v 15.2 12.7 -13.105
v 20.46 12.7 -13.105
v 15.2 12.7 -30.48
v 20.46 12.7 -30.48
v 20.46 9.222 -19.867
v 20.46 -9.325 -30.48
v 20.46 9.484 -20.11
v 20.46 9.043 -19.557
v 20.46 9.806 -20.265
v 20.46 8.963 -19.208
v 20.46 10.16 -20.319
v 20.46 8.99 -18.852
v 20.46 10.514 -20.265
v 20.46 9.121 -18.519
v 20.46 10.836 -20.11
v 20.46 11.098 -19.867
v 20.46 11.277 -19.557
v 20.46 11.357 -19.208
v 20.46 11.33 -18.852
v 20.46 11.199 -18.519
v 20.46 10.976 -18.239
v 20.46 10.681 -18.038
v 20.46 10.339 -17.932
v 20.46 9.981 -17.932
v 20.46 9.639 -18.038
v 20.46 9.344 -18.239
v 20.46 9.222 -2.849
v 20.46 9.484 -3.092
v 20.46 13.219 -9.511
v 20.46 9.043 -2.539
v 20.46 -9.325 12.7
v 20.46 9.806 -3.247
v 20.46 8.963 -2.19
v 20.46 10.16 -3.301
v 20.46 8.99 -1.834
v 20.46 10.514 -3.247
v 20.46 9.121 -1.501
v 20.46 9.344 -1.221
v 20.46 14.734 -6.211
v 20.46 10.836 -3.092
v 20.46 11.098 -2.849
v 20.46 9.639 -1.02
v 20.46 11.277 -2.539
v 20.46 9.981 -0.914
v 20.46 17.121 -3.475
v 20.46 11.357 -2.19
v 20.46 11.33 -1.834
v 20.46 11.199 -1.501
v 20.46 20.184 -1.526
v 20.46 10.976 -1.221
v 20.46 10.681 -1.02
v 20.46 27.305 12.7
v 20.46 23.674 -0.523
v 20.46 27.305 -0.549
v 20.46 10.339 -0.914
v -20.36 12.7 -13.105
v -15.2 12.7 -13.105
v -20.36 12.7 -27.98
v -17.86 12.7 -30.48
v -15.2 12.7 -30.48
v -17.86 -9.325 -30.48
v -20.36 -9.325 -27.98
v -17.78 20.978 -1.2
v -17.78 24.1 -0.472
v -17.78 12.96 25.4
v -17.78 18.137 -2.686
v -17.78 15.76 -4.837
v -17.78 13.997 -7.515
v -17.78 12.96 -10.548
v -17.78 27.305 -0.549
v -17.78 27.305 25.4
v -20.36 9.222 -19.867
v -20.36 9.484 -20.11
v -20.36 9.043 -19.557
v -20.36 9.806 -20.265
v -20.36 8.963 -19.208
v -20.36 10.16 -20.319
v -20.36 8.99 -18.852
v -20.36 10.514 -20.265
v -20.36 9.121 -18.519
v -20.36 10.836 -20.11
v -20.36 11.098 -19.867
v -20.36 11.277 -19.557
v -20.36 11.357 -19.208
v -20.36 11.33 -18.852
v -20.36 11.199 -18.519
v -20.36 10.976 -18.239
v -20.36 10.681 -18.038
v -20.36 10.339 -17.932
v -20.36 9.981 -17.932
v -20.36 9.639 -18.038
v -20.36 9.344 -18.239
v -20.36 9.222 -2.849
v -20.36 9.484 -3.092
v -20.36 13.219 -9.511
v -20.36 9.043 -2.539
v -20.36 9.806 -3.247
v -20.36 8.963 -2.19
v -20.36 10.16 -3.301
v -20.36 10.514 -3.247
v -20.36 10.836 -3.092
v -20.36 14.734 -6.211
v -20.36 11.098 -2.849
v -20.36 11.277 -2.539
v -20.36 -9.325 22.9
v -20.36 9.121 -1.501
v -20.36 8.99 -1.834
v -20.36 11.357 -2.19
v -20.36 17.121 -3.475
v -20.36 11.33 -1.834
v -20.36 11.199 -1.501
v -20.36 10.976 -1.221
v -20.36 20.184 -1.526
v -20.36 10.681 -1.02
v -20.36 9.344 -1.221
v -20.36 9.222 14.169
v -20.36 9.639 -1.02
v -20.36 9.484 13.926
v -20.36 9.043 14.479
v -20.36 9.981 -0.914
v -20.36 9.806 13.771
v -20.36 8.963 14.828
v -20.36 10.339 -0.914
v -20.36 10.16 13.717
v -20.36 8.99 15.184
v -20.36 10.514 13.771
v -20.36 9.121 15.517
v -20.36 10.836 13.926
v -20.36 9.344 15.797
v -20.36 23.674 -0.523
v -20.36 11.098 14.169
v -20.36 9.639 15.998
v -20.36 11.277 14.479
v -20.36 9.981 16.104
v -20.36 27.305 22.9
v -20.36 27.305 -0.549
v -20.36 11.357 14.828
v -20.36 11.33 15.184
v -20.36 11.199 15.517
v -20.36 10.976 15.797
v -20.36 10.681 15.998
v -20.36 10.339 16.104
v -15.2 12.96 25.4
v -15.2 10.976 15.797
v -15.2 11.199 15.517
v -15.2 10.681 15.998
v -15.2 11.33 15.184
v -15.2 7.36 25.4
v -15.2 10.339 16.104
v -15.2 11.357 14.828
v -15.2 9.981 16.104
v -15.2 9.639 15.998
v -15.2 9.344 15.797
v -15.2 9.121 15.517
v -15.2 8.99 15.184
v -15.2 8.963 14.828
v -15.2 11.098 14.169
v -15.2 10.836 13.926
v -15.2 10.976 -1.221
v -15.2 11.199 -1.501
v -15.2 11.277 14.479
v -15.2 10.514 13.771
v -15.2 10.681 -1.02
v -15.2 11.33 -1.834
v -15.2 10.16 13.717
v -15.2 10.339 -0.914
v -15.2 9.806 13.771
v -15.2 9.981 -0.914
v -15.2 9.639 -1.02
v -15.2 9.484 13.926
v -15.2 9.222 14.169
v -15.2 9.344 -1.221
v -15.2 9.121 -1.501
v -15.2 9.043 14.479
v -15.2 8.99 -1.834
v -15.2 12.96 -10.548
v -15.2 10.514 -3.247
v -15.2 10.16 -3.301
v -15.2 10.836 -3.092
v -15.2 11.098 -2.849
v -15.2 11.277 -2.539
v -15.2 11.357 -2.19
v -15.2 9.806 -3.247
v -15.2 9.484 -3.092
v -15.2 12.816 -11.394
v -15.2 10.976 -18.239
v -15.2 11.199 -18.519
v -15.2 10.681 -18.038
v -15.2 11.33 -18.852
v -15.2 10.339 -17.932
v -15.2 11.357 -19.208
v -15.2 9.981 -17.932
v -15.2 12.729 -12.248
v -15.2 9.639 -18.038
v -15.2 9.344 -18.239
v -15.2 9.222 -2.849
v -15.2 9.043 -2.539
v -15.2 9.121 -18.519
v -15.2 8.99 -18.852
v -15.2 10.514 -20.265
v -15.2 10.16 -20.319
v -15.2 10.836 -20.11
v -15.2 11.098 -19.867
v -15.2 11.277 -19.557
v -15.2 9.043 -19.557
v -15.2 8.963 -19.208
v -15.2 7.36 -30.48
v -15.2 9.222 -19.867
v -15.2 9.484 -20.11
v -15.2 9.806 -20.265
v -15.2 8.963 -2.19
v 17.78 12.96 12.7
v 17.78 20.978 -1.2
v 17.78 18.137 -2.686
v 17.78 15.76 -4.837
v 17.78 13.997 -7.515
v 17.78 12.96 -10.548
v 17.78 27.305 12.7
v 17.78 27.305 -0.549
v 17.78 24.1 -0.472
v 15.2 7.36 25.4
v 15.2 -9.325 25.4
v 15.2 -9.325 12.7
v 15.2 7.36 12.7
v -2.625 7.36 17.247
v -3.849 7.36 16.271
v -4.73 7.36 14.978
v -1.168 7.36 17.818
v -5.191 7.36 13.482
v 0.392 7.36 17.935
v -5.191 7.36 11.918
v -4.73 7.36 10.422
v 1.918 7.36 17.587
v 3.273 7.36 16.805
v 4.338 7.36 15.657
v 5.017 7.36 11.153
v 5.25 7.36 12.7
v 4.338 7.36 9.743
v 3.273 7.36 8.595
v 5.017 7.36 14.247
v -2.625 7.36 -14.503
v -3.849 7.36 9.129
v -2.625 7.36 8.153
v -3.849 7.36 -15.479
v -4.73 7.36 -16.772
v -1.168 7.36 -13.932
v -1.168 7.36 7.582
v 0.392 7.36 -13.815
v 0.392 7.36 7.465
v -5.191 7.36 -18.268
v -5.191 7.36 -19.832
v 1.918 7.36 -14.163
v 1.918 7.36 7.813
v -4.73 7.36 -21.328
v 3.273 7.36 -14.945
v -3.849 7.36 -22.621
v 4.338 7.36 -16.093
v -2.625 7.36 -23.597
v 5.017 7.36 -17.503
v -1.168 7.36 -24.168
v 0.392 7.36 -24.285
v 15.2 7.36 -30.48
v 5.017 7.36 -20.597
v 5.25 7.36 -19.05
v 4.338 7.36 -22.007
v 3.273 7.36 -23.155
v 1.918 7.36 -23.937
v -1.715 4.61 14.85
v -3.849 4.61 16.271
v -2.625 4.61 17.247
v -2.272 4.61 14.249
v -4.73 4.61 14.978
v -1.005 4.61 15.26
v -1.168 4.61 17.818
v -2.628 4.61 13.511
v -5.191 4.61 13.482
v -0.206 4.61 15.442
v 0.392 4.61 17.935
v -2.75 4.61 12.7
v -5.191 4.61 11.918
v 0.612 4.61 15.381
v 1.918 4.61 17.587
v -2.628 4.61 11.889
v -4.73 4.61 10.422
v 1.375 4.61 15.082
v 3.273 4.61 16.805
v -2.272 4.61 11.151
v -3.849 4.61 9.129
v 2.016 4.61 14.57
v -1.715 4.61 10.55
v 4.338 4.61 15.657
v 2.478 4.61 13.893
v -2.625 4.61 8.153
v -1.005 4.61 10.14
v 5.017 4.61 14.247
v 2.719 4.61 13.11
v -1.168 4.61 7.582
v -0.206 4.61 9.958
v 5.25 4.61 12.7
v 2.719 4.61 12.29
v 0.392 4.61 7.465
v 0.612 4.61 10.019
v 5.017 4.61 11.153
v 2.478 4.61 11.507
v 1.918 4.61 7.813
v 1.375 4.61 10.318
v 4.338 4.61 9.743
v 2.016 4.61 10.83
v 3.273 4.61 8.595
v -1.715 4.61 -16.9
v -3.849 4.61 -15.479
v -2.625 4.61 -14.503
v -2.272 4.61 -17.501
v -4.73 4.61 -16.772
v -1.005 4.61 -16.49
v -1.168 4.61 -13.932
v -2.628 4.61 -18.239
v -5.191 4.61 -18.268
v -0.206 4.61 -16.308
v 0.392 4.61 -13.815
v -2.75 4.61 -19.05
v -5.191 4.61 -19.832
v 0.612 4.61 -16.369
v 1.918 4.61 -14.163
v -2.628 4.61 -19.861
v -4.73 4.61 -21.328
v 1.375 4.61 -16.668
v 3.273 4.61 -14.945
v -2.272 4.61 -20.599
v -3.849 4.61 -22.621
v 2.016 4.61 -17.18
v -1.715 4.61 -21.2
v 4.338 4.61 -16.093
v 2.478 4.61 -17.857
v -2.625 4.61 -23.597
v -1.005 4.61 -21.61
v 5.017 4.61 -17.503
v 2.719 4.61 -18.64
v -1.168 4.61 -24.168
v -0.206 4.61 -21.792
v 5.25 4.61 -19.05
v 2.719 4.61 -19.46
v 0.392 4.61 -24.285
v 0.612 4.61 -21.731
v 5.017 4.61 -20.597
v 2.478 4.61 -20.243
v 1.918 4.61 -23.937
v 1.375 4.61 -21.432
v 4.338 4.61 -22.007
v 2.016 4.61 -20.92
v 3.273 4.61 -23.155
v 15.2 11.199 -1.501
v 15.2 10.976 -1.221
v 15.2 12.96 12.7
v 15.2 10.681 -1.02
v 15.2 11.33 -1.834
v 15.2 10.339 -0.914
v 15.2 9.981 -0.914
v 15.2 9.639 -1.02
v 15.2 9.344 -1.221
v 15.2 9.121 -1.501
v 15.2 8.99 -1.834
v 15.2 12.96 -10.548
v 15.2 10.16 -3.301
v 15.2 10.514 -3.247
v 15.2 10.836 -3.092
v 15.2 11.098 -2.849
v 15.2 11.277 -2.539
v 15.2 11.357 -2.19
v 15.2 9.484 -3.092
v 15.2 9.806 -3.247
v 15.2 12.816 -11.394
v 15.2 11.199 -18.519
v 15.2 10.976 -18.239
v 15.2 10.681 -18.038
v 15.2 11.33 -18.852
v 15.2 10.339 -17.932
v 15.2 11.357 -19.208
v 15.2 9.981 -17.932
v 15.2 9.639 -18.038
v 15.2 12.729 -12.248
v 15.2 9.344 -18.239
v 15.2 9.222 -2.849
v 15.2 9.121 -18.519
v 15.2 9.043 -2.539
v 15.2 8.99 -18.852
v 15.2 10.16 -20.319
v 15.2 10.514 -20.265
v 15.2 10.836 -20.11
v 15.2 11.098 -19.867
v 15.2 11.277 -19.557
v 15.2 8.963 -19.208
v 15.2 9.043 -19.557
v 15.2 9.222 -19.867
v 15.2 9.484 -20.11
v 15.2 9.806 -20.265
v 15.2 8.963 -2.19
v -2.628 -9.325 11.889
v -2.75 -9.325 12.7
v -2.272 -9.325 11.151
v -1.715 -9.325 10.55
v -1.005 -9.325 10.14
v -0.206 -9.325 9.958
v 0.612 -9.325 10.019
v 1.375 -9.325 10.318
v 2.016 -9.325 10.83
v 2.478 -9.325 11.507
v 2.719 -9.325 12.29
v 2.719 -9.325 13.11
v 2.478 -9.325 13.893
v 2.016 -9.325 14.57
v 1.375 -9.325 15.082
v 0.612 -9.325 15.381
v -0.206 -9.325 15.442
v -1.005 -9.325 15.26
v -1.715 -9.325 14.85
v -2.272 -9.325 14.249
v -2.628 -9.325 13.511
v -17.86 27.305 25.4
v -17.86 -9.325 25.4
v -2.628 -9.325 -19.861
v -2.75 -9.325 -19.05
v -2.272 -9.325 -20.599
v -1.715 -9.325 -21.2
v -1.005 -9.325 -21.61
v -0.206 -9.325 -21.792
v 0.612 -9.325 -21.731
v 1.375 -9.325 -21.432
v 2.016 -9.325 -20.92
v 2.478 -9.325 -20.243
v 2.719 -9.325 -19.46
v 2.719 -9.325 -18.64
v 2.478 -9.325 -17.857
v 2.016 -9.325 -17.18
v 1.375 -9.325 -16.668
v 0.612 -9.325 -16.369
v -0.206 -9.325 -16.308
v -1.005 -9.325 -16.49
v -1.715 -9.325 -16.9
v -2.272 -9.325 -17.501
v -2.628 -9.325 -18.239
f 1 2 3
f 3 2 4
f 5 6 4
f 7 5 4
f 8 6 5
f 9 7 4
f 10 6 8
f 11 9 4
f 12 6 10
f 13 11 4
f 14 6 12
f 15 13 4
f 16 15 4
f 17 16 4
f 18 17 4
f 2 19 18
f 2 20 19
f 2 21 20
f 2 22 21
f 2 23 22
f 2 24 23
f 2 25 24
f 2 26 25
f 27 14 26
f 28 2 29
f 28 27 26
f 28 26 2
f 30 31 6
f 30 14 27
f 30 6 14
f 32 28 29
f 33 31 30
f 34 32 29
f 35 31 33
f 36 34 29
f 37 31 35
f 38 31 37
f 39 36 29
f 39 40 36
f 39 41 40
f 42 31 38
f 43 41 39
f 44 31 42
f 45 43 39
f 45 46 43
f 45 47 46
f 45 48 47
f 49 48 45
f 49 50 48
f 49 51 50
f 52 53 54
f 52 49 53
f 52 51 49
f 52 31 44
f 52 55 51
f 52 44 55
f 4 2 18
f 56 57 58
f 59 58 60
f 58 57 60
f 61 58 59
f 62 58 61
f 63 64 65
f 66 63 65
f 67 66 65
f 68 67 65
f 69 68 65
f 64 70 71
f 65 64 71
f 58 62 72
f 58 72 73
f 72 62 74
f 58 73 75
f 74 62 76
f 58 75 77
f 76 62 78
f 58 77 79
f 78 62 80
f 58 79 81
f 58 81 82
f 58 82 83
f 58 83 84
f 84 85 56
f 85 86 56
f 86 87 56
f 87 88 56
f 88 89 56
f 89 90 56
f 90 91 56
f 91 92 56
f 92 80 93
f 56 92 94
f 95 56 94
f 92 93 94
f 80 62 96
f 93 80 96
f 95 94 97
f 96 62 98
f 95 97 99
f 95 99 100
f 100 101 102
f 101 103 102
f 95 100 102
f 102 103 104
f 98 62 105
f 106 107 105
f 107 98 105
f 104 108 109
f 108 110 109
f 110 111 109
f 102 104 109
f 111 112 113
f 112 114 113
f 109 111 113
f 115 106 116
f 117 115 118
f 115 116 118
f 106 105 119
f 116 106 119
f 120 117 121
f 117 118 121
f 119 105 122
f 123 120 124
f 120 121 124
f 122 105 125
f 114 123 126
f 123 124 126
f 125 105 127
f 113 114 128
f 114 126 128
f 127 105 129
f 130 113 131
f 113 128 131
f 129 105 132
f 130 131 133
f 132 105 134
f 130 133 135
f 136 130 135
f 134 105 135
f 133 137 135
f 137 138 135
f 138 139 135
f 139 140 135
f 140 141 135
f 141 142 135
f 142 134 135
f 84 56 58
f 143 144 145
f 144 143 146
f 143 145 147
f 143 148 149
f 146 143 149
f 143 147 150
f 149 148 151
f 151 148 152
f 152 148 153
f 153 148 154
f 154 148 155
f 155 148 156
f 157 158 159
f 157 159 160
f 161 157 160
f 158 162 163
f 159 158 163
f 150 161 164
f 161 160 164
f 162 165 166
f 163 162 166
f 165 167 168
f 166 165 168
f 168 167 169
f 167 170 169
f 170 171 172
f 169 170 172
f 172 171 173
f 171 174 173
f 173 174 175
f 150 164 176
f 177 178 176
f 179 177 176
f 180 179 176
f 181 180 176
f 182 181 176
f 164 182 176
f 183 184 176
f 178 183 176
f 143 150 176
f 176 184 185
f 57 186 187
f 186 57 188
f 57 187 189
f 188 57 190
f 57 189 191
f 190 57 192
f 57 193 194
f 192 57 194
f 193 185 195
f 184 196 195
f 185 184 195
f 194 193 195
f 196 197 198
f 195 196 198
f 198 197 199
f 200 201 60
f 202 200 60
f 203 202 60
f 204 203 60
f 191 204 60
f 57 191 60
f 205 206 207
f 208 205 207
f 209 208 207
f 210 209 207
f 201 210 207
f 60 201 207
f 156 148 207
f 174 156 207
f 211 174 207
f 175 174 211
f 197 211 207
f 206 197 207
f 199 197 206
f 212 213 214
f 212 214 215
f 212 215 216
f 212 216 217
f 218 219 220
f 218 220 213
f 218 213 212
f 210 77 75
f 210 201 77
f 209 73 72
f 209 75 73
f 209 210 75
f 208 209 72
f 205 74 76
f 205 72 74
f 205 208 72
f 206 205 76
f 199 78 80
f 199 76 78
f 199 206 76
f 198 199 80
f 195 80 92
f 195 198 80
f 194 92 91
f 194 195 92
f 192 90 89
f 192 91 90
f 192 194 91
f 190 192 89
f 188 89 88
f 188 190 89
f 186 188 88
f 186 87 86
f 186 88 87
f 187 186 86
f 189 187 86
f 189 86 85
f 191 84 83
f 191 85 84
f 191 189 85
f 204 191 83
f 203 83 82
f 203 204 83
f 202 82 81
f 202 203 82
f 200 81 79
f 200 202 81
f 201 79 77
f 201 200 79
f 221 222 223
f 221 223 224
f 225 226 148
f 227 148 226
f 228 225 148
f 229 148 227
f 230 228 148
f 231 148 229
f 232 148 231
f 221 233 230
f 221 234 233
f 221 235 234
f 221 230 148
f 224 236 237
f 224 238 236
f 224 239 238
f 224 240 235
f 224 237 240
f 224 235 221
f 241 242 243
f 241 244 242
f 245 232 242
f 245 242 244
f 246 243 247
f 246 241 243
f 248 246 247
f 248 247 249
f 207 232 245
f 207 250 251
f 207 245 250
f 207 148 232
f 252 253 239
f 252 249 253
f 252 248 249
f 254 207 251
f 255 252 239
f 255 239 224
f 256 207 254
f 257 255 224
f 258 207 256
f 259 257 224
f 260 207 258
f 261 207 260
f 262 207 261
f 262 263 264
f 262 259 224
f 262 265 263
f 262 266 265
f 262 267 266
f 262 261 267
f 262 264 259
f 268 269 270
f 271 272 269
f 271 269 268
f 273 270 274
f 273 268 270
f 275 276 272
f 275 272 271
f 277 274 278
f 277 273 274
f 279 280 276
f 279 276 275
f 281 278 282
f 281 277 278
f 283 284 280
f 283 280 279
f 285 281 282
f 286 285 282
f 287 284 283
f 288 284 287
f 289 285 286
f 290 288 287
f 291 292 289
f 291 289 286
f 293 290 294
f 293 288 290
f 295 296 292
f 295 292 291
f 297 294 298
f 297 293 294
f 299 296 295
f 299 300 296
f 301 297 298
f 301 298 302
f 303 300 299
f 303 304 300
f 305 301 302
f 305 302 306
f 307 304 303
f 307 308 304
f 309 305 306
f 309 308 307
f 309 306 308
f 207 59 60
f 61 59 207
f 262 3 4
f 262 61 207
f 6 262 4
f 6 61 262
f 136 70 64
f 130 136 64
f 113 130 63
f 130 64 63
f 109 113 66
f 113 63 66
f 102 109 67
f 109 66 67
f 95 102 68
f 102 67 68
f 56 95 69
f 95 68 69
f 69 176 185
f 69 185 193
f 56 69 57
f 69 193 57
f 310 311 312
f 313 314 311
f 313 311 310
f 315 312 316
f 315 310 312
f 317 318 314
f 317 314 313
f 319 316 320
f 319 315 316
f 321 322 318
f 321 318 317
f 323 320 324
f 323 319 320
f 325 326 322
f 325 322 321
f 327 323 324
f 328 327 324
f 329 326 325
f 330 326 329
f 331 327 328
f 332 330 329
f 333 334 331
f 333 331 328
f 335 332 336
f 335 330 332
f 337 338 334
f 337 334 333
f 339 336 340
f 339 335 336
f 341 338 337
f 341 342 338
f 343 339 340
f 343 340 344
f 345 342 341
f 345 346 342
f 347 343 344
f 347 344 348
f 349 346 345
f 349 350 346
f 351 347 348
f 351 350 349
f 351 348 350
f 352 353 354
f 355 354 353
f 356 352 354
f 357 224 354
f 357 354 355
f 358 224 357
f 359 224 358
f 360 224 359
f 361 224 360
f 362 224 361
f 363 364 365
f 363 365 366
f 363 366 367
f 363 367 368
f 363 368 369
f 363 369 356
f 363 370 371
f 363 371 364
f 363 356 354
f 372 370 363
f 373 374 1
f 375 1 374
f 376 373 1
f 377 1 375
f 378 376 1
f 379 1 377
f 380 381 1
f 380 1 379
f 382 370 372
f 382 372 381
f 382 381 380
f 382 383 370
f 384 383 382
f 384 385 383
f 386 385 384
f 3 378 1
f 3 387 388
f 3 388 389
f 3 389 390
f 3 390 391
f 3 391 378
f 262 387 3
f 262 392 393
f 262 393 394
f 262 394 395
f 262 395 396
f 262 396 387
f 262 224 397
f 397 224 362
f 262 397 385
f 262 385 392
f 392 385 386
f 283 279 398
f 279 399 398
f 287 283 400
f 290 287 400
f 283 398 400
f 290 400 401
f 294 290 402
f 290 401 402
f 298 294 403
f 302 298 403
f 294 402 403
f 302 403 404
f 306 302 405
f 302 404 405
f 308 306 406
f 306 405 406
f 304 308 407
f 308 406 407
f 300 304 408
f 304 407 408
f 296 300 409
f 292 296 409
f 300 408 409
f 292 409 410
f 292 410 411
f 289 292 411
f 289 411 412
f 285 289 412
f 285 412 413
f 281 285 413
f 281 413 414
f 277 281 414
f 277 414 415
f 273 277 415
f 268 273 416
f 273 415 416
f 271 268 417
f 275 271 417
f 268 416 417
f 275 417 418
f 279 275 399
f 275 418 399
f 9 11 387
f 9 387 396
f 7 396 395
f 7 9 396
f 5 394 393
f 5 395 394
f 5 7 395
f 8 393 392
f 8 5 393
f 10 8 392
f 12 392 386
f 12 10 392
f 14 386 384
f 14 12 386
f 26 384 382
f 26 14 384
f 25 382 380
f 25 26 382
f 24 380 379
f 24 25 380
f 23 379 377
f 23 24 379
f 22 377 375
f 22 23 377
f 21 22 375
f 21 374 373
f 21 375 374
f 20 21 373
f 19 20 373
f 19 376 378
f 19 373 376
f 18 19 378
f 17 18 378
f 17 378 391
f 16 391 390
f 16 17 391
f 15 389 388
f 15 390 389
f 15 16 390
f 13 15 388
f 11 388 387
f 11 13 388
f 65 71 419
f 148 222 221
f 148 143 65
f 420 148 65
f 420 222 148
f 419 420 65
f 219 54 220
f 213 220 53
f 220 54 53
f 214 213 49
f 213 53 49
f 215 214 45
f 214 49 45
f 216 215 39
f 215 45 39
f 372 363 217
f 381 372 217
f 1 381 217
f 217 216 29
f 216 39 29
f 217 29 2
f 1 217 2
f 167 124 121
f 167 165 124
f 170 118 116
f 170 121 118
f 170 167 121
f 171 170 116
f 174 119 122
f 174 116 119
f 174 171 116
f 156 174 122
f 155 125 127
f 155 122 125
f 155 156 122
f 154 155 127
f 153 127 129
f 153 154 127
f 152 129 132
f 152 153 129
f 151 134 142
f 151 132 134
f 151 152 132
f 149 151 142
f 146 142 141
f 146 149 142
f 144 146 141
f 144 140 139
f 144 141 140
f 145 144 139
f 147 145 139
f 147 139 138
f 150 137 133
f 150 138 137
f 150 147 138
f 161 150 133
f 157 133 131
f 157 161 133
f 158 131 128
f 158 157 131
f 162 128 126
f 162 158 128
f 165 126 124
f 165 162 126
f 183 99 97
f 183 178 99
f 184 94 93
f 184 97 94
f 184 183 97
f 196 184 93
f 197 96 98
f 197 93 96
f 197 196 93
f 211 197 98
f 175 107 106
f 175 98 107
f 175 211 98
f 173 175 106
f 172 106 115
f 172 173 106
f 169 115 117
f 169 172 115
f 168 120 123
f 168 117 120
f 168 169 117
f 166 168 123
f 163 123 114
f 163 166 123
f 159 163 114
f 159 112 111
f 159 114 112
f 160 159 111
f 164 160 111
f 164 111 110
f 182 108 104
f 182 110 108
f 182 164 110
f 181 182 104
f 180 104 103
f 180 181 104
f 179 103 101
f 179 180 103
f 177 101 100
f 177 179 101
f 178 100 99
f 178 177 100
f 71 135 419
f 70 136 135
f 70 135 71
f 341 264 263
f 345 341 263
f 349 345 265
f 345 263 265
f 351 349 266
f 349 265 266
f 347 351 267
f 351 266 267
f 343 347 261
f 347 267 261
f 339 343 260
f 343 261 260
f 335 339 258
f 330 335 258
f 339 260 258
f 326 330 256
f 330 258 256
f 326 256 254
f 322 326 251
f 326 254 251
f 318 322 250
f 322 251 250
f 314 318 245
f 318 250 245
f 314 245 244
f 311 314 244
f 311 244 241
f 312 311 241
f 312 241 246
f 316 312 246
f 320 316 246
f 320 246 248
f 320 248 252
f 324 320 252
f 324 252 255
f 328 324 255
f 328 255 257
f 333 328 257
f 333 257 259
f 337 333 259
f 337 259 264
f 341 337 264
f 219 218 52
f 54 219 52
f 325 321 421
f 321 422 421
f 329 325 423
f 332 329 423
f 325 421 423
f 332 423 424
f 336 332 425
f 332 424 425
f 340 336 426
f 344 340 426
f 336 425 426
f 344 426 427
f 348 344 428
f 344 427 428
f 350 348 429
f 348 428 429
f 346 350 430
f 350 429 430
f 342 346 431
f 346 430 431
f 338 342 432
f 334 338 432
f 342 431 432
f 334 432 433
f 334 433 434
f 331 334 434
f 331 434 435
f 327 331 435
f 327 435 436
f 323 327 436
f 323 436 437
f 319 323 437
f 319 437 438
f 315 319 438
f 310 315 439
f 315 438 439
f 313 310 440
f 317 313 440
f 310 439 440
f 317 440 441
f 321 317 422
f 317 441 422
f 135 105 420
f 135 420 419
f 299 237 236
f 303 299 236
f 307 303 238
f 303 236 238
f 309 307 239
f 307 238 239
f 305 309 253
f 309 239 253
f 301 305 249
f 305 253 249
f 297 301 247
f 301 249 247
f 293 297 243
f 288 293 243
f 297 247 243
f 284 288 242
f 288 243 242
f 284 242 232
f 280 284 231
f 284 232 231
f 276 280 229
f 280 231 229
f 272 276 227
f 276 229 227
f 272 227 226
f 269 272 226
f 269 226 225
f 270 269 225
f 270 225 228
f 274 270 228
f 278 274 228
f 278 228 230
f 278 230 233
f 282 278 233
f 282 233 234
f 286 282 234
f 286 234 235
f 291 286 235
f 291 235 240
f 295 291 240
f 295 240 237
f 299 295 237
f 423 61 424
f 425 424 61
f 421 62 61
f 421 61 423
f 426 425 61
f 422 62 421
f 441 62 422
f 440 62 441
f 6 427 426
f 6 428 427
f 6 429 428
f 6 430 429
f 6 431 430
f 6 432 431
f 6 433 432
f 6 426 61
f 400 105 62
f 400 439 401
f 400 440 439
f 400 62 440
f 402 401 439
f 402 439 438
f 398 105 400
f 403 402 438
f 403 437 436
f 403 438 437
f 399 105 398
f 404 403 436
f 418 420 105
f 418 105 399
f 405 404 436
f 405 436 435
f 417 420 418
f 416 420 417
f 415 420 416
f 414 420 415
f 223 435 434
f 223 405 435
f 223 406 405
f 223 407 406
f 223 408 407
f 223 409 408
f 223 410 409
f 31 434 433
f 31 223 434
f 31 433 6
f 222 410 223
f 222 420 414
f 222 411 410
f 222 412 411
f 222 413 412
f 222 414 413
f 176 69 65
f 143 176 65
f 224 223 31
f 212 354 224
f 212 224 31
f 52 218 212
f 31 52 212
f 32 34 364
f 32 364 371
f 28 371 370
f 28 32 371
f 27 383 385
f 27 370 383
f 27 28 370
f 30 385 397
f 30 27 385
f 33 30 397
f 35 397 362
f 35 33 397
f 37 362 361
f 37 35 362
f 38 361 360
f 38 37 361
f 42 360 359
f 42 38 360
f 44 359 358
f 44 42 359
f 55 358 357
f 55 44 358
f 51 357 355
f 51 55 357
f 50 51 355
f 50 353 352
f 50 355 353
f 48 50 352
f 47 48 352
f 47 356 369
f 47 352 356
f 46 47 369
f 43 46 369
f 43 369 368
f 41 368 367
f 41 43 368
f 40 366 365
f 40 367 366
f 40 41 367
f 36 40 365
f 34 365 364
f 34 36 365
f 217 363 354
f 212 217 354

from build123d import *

# Parameters (mm, degrees)
SKETCH1_W                       = 45.72
SKETCH1_H                       = 60.96
BOSS_EXTRUDE1_DEPTH             = 6.35
SKETCH2_W                       = 7.6600046
SKETCH2_H                       = 60.96
BOSS_EXTRUDE2_DEPTH             = 20.955
LPATTERN1_COUNT                 = 3
LPATTERN1_PITCH                 = 17.018
SKETCH1_3_W                     = 45.72
SKETCH1_3_H                     = 60.96
BOSS_EXTRUDE3_DEPTH             = 2.54
CUT_EXTRUDE1_START              = 15.199995
SKETCH11_W                      = 60.96
SKETCH11_H                      = 14.3449802
CUT_EXTRUDE1_DEPTH              = 17.78
CUT_EXTRUDE2_DEPTH              = 62.358877312
SKETCH17_W                      = 45.72
SKETCH17_H                      = 60.96
BOSS_EXTRUDE4_DEPTH             = 6.785
SKETCH19_W                      = 30.3999908
SKETCH19_H                      = 60.96
BOSS_EXTRUDE5_DEPTH             = 1.0100056
CBORE_FOR_M5_SBHCS2_D           = 5.5
CBORE_FOR_M5_SBHCS2_CBORE_D     = 10.5
CBORE_FOR_M5_SBHCS2_CBORE_DEPTH = 2.75
CUT_EXTRUDE3_DEPTH              = 82.222264916
CUT_EXTRUDE3_DEPTH_BACK         = 82.222264916
SKETCH24_W                      = 5.08
SKETCH24_H                      = 45.72
SKETCH25_W                      = 7.6600046
SKETCH25_H                      = 36.63
CUT_EXTRUDE4_DEPTH              = 12.7
SKETCH26_W                      = 2.400000026
SKETCH26_H                      = 36.63
CUT_EXTRUDE5_DEPTH              = 67.262485805
SKETCH27_W                      = 2.5
SKETCH27_H                      = 36.63
CUT_EXTRUDE6_DEPTH              = 67.262485805
CHAMFER1_SIZE                   = 2.5


with BuildPart() as part:
    # Sketch1 → Boss-Extrude1 (new body)
    with BuildSketch(Plane(origin=(0, 0, 0), x_dir=(1, 0, 0), z_dir=(0, 1, 0))):
        Rectangle(SKETCH1_W, SKETCH1_H)
    extrude(amount=BOSS_EXTRUDE1_DEPTH)

    # Sketch2 → Boss-Extrude2 (add)
    with BuildSketch(Plane(origin=(0, 6.35, 0), x_dir=(1, 0, 0), z_dir=(0, 1, 0))):
        with Locations((-19.0299977, 0)):
            Rectangle(SKETCH2_W, SKETCH2_H)
        with Locations((19.0299977, 0)):
            Rectangle(SKETCH2_W, SKETCH2_H)
    extrude(amount=BOSS_EXTRUDE2_DEPTH)

    # Sketch7 → M2 Clearance Hole2 (revolve, cut)
    with BuildSketch(Plane(origin=(22.86, 10.16, 14.9171914), x_dir=(0, 0, -1), z_dir=(0, 1, 0))):
        Polygon((0, 0), (0, 46.441032743), (1.2, 45.72), (1.2, 0), align=None)
    m2_clearance_hole2 = revolve(axis=Axis((29.21, 10.16, 14.9171914), (-1, 0, 0)), mode=Mode.SUBTRACT)

    # LPattern1: M2 Clearance Hole2 ×3
    with Locations(*[(0, 0, -i * LPATTERN1_PITCH) for i in range(1, LPATTERN1_COUNT)]):
        add(m2_clearance_hole2, mode=Mode.SUBTRACT)

    # Sketch1<3> → Boss-Extrude3 (add)
    with BuildSketch(Plane(origin=(0, 0, 0), x_dir=(1, 0, 0), z_dir=(0, 1, 0))):
        Rectangle(SKETCH1_3_W, SKETCH1_3_H)
    extrude(amount=-BOSS_EXTRUDE3_DEPTH)

    # Sketch11 → Cut-Extrude1 (cut, symmetric)
    with BuildSketch(Plane.ZY.offset(-15.1999954).offset(CUT_EXTRUDE1_START)):
        with Locations((0, 20.1325099)):
            Rectangle(SKETCH11_W, SKETCH11_H)
    extrude(amount=CUT_EXTRUDE1_DEPTH, both=True, mode=Mode.SUBTRACT)

    # Sketch12 → Cut-Extrude2 (cut, through all)
    with BuildSketch(Plane(origin=(22.86, 0, 0), x_dir=(0, 0, -1), z_dir=(1, 0, 0))):
        with BuildLine():
            Line((13.105000048, 12.7), (30.48, 12.7))
            Line((30.48, 12.7), (30.48, 27.305))
            Line((30.48, 27.305), (25.661312206, 27.305))
            ThreePointArc((25.661312206, 27.305), (3.474748234, 33.679387055), (13.105000048, 12.7))
        make_face()
    extrude(amount=-CUT_EXTRUDE2_DEPTH, mode=Mode.SUBTRACT)

    # Sketch17 → Boss-Extrude4 (add)
    with BuildSketch(Plane.XZ.offset(2.54)):
        Rectangle(SKETCH17_W, SKETCH17_H)
    extrude(amount=BOSS_EXTRUDE4_DEPTH)

    # Sketch19 → Boss-Extrude5 (add)
    with BuildSketch(Plane(origin=(0, 6.35, 0), x_dir=(1, 0, 0), z_dir=(0, 1, 0))):
        Rectangle(SKETCH19_W, SKETCH19_H)
    extrude(amount=BOSS_EXTRUDE5_DEPTH)

    # CBORE for M5 SBHCS2 (through all)
    with Locations(Plane(origin=(0, 7.3600056, 0), x_dir=(1, 0, 0), z_dir=(0, 1, 0))):
        with Locations((0, -12.7), (0, 19.05)):
            CounterBoreHole(CBORE_FOR_M5_SBHCS2_D / 2, CBORE_FOR_M5_SBHCS2_CBORE_D / 2, CBORE_FOR_M5_SBHCS2_CBORE_DEPTH)

    # Sketch24 → Cut-Extrude3 (cut, two sides: drawn at the far end of the back side and taken through both)
    with BuildSketch(Plane(origin=(31.571183672, -12.7, -14.6188086), x_dir=(0, 0, -1), z_dir=(0, 1, 0)).offset(-CUT_EXTRUDE3_DEPTH_BACK)):
        with Locations((-42.5588086, 31.571183672)):
            Rectangle(SKETCH24_W, SKETCH24_H)
    extrude(amount=CUT_EXTRUDE3_DEPTH + CUT_EXTRUDE3_DEPTH_BACK, mode=Mode.SUBTRACT)

    # Sketch25 → Cut-Extrude4 (cut)
    with BuildSketch(Plane.XY.offset(25.4)):
        with Locations((19.0299977, 8.99)):
            Rectangle(SKETCH25_W, SKETCH25_H)
    extrude(amount=-CUT_EXTRUDE4_DEPTH, mode=Mode.SUBTRACT)

    # Sketch26 → Cut-Extrude5 (cut, through all)
    with BuildSketch(Plane.XY.offset(25.4)):
        with Locations((21.659999987, 8.99)):
            Rectangle(SKETCH26_W, SKETCH26_H)
    extrude(amount=-CUT_EXTRUDE5_DEPTH, mode=Mode.SUBTRACT)

    # Sketch27 → Cut-Extrude6 (cut, through all)
    with BuildSketch(Plane.XY.offset(25.4)):
        with Locations((-21.61, 8.99)):
            Rectangle(SKETCH27_W, SKETCH27_H)
    extrude(amount=-CUT_EXTRUDE6_DEPTH, mode=Mode.SUBTRACT)

    # Chamfer1
    chamfer1_edges = [part.edges().sort_by_distance(p)[0] for p in [
        (-20.36, 1.6875, -30.48),
        (-20.36, 8.99, 25.4),
    ]]
    chamfer(chamfer1_edges, length=CHAMFER1_SIZE)


solid = part.part
